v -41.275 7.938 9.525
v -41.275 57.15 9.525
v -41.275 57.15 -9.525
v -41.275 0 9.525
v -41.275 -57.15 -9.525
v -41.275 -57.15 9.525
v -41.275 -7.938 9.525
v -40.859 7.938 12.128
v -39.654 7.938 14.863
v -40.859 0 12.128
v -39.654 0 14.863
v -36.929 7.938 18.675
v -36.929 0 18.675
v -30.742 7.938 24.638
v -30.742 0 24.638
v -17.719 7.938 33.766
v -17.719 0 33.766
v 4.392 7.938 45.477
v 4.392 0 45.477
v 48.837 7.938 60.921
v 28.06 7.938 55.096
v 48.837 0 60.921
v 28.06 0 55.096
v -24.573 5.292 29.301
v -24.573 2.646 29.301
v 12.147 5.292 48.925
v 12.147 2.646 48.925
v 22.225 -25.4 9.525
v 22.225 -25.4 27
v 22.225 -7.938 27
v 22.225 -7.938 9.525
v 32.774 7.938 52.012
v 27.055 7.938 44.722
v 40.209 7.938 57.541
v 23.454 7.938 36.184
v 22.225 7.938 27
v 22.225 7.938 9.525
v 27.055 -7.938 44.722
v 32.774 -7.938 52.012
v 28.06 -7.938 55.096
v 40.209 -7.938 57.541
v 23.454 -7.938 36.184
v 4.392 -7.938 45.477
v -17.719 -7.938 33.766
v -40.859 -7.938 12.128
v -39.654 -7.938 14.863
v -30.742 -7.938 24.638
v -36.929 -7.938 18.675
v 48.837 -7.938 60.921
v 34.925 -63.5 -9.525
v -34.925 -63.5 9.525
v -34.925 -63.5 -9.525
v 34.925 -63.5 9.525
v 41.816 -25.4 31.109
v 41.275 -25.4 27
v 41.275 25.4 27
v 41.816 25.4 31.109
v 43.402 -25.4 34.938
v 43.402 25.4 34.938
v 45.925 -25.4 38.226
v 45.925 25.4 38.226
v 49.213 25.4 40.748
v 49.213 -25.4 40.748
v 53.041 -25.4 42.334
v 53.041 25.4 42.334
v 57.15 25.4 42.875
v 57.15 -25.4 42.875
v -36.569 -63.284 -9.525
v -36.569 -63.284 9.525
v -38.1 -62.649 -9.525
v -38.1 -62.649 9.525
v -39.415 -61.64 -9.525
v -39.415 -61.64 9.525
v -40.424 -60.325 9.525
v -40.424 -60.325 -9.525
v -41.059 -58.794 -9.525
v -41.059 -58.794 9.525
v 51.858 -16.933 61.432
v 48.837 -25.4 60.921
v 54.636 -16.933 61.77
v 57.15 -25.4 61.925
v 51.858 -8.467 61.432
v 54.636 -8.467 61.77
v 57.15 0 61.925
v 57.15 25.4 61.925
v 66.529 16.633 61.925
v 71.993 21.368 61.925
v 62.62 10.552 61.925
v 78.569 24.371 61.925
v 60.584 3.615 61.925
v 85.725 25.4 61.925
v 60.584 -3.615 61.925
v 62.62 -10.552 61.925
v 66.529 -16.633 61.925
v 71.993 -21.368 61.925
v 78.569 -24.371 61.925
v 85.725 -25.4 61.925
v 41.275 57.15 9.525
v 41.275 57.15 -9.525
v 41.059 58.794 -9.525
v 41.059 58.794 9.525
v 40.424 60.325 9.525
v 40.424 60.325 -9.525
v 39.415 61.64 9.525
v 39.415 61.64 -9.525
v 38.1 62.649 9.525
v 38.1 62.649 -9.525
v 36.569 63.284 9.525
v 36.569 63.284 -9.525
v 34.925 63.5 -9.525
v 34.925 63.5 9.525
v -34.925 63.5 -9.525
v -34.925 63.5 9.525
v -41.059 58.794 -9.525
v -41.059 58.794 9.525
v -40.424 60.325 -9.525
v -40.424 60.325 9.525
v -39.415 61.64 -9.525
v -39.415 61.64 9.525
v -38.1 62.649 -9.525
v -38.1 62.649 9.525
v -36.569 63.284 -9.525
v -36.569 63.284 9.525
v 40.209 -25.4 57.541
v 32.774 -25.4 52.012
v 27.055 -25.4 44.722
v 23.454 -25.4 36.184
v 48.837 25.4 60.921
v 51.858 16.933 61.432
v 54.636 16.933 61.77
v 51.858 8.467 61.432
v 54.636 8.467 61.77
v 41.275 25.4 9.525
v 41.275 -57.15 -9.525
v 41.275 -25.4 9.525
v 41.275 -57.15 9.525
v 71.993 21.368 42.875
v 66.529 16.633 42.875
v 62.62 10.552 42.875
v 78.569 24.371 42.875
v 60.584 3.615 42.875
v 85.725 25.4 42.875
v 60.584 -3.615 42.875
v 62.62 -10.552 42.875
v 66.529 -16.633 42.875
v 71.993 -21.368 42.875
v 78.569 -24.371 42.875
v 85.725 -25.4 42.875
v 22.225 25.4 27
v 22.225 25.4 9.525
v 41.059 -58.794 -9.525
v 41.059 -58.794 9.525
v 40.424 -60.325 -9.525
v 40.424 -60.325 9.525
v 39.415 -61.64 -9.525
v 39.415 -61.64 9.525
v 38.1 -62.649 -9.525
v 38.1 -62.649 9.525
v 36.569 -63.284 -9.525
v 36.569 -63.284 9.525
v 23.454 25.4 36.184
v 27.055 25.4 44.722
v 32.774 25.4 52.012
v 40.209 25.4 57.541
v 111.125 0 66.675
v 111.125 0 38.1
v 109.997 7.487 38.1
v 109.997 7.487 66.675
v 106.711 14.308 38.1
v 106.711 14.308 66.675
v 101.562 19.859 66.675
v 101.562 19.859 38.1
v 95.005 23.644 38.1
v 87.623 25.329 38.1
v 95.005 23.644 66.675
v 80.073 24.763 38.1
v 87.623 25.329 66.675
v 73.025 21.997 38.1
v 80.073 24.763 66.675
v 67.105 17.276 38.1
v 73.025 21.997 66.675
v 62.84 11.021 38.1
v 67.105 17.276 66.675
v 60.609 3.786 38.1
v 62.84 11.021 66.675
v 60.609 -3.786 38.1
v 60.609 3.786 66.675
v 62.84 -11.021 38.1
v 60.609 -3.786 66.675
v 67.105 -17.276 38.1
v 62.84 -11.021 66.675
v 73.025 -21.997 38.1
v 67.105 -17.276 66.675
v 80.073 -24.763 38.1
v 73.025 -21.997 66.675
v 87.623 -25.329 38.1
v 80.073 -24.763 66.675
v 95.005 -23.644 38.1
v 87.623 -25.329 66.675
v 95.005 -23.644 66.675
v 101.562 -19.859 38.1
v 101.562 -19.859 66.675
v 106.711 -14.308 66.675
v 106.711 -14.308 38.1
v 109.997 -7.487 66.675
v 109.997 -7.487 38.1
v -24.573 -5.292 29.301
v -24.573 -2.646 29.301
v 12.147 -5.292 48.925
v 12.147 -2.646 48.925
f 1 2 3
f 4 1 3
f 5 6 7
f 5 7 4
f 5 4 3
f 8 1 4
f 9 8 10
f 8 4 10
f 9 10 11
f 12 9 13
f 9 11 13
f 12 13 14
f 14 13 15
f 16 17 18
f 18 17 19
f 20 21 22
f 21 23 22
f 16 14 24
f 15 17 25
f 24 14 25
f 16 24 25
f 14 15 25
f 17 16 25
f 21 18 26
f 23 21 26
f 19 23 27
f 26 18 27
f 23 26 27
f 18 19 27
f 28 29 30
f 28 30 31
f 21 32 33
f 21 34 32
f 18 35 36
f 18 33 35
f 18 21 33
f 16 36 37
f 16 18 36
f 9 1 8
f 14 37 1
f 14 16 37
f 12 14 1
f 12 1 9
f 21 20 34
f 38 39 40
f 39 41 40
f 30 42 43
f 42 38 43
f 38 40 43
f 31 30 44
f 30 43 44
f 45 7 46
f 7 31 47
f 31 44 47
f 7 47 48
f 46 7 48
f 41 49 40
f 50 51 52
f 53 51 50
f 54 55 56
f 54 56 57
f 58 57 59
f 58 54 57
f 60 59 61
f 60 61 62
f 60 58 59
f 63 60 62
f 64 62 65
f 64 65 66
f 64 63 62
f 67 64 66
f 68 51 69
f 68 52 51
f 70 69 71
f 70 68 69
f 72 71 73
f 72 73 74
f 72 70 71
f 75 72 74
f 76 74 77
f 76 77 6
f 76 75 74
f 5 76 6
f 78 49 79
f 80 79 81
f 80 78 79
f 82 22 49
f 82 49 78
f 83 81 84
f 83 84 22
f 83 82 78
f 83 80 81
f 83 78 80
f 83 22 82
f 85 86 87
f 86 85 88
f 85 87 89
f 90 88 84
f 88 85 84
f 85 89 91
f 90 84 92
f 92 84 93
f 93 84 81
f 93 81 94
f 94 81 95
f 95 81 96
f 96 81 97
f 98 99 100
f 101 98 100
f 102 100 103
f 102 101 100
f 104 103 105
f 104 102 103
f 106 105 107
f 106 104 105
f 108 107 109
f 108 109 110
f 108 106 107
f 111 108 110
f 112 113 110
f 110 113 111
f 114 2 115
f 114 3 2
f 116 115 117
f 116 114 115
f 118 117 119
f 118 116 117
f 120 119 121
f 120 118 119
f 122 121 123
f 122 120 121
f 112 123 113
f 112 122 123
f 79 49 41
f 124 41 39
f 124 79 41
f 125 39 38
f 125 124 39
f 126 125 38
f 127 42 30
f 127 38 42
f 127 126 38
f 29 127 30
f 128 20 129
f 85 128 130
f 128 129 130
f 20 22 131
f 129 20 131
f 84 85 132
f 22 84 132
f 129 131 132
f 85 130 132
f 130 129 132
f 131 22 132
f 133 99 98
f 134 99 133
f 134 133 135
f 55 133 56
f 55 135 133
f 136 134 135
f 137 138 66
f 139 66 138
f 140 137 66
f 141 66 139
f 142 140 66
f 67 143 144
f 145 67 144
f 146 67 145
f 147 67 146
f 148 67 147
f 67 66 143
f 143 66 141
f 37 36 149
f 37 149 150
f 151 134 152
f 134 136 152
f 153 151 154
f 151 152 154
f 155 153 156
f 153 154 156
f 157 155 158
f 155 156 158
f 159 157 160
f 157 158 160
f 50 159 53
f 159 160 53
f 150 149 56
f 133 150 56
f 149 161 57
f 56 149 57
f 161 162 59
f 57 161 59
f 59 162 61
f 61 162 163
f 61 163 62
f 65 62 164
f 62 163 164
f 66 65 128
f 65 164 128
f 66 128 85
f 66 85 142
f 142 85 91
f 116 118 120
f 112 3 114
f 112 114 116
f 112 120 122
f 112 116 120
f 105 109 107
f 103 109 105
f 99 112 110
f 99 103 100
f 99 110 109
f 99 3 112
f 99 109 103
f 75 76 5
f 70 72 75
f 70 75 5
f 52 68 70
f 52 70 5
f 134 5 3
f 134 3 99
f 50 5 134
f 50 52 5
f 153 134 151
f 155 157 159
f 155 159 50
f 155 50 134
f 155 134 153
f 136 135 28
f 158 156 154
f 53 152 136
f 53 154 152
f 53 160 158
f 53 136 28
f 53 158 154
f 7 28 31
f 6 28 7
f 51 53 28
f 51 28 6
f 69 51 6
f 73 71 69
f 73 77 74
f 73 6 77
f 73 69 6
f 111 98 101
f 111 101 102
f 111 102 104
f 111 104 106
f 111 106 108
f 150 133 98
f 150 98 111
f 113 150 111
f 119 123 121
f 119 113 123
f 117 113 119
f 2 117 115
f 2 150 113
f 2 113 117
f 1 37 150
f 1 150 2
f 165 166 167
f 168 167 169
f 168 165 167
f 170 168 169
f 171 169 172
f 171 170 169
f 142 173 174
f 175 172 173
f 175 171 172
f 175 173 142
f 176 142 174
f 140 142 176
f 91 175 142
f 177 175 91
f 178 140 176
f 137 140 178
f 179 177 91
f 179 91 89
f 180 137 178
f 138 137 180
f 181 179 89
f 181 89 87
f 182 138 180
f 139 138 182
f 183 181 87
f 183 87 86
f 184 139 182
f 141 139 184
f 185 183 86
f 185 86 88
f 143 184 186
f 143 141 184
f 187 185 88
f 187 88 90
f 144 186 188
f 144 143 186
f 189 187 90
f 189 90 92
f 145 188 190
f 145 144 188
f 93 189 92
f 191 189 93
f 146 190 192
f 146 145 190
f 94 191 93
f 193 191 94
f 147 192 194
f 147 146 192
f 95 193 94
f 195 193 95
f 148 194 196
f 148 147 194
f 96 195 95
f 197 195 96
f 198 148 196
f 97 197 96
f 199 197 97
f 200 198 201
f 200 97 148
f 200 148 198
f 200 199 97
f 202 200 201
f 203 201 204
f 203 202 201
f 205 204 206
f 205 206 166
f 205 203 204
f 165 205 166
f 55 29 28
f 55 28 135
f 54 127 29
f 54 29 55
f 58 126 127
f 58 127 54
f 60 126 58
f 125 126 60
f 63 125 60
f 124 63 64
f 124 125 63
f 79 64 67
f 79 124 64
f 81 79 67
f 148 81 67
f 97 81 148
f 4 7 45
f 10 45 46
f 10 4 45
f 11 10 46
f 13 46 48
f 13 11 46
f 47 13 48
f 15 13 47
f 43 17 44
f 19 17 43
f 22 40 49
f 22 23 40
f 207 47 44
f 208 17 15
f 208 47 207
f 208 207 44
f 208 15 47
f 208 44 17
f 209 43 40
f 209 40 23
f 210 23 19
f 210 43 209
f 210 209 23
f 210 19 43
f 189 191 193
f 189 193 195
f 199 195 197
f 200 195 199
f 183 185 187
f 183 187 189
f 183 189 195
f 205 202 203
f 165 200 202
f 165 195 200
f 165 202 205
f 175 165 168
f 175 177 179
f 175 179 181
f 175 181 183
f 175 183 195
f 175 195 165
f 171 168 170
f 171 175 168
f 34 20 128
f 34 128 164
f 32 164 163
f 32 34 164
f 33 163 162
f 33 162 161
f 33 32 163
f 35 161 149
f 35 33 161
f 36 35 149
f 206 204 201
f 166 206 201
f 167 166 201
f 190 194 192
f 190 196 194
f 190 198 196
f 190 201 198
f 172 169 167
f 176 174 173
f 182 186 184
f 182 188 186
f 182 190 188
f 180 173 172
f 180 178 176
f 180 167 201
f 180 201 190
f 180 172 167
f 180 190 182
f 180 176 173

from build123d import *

# Parameters (mm, degrees)
F1_DEPTH = 63.5
F2_DEPTH = 25.4
F3_DEPTH = 7.9375
F0_W     = 25.4
F0_H     = 19.05
F4_DEPTH = 25.4
F6_R     = 6.35


# Not quite as in the source:
# - a feature names something its author has since deleted; it is built from what else it names


with BuildPart() as f1:
    # F0 (on Front) → F1 (new body, symmetric)
    with BuildSketch(Plane.XZ):
        Polygon((-41.275, 9.525), (-41.275, -9.525), (41.275, -9.525), (41.275, 9.525), (22.225, 9.525), align=None)
    extrude(amount=F1_DEPTH, both=True)

    # F0 (on Front) → F2 (join, symmetric)
    with BuildSketch(Plane.XZ):
        with BuildLine():
            Line((22.225, 9.525), (41.275, 9.525))
            Line((41.275, 9.525), (41.275, 27.0002))
            ThreePointArc((41.275, 27.0002), (45.9246798487, 38.2255201513), (57.15, 42.8752))
            Line((57.15, 42.8752), (60.325, 42.8752))
            Line((60.325, 42.8752), (60.325, 61.9252))
            Line((60.325, 61.9252), (57.15, 61.9252))
            add(Edge.make_bspline(
                [(48.8367454286, 60.9213648301), (51.9709953624, 61.5161426584), (54.7763944368, 61.8635493609), (57.15, 61.9252)],
                knots=[100.9548457495, 100.9548457495, 100.9548457495, 100.9548457495, 111.5045361635, 111.5045361635, 111.5045361635, 111.5045361635], degree=3))
            ThreePointArc((48.8367454286, 60.9213648301), (29.6718628642, 48.5572778295), (22.225, 27.0002))
            Line((22.225, 27.0002), (22.225, 9.525))
        make_face()
    extrude(amount=F2_DEPTH, both=True)

    # F0 (on Front) → F3 (join, symmetric)
    with BuildSketch(Plane.XZ):
        with BuildLine():
            add(Edge.make_bspline(
                [(-41.275, 9.525), (-41.2637939453, 26.8850534088), (18.8436644761, 55.2296618934), (48.8367454286, 60.9213648301)],
                knots=[0, 0, 0, 0, 100.9548457495, 100.9548457495, 100.9548457495, 100.9548457495], degree=3))
            Line((-41.275, 9.525), (22.225, 9.525))
            Line((22.225, 9.525), (22.225, 27.0002))
            ThreePointArc((22.225, 27.0002), (29.6718628642, 48.5572778295), (48.8367454286, 60.9213648301))
        make_face()
    extrude(amount=F3_DEPTH, both=True)

    # F0 (on Front) → F4 (join, symmetric)
    with BuildSketch(Plane.XZ):
        with Locations((73.025, 52.4002)):
            Rectangle(F0_W, F0_H)
    extrude(amount=F4_DEPTH, both=True)

    # F0 (on Front) → F5 (revolve)
    with BuildSketch(Plane.XZ):
        Polygon((85.725, 66.675), (85.725, 61.9252), (85.725, 42.8752), (85.725, 38.1), (111.125, 38.1), (111.125, 66.675), align=None)
    revolve(axis=Axis((85.725, 0, 52.3875), (0, 0, 1)))

    # F6
    f6_edges = [f1.edges().sort_by_distance(p)[0] for p in [
        (41.275, 63.5, 0),
        (41.275, -63.5, 0),
        (-41.275, -63.5, 0),
        (-41.275, 63.5, 0),
    ]]
    fillet(f6_edges, radius=F6_R)


solid = f1.part
